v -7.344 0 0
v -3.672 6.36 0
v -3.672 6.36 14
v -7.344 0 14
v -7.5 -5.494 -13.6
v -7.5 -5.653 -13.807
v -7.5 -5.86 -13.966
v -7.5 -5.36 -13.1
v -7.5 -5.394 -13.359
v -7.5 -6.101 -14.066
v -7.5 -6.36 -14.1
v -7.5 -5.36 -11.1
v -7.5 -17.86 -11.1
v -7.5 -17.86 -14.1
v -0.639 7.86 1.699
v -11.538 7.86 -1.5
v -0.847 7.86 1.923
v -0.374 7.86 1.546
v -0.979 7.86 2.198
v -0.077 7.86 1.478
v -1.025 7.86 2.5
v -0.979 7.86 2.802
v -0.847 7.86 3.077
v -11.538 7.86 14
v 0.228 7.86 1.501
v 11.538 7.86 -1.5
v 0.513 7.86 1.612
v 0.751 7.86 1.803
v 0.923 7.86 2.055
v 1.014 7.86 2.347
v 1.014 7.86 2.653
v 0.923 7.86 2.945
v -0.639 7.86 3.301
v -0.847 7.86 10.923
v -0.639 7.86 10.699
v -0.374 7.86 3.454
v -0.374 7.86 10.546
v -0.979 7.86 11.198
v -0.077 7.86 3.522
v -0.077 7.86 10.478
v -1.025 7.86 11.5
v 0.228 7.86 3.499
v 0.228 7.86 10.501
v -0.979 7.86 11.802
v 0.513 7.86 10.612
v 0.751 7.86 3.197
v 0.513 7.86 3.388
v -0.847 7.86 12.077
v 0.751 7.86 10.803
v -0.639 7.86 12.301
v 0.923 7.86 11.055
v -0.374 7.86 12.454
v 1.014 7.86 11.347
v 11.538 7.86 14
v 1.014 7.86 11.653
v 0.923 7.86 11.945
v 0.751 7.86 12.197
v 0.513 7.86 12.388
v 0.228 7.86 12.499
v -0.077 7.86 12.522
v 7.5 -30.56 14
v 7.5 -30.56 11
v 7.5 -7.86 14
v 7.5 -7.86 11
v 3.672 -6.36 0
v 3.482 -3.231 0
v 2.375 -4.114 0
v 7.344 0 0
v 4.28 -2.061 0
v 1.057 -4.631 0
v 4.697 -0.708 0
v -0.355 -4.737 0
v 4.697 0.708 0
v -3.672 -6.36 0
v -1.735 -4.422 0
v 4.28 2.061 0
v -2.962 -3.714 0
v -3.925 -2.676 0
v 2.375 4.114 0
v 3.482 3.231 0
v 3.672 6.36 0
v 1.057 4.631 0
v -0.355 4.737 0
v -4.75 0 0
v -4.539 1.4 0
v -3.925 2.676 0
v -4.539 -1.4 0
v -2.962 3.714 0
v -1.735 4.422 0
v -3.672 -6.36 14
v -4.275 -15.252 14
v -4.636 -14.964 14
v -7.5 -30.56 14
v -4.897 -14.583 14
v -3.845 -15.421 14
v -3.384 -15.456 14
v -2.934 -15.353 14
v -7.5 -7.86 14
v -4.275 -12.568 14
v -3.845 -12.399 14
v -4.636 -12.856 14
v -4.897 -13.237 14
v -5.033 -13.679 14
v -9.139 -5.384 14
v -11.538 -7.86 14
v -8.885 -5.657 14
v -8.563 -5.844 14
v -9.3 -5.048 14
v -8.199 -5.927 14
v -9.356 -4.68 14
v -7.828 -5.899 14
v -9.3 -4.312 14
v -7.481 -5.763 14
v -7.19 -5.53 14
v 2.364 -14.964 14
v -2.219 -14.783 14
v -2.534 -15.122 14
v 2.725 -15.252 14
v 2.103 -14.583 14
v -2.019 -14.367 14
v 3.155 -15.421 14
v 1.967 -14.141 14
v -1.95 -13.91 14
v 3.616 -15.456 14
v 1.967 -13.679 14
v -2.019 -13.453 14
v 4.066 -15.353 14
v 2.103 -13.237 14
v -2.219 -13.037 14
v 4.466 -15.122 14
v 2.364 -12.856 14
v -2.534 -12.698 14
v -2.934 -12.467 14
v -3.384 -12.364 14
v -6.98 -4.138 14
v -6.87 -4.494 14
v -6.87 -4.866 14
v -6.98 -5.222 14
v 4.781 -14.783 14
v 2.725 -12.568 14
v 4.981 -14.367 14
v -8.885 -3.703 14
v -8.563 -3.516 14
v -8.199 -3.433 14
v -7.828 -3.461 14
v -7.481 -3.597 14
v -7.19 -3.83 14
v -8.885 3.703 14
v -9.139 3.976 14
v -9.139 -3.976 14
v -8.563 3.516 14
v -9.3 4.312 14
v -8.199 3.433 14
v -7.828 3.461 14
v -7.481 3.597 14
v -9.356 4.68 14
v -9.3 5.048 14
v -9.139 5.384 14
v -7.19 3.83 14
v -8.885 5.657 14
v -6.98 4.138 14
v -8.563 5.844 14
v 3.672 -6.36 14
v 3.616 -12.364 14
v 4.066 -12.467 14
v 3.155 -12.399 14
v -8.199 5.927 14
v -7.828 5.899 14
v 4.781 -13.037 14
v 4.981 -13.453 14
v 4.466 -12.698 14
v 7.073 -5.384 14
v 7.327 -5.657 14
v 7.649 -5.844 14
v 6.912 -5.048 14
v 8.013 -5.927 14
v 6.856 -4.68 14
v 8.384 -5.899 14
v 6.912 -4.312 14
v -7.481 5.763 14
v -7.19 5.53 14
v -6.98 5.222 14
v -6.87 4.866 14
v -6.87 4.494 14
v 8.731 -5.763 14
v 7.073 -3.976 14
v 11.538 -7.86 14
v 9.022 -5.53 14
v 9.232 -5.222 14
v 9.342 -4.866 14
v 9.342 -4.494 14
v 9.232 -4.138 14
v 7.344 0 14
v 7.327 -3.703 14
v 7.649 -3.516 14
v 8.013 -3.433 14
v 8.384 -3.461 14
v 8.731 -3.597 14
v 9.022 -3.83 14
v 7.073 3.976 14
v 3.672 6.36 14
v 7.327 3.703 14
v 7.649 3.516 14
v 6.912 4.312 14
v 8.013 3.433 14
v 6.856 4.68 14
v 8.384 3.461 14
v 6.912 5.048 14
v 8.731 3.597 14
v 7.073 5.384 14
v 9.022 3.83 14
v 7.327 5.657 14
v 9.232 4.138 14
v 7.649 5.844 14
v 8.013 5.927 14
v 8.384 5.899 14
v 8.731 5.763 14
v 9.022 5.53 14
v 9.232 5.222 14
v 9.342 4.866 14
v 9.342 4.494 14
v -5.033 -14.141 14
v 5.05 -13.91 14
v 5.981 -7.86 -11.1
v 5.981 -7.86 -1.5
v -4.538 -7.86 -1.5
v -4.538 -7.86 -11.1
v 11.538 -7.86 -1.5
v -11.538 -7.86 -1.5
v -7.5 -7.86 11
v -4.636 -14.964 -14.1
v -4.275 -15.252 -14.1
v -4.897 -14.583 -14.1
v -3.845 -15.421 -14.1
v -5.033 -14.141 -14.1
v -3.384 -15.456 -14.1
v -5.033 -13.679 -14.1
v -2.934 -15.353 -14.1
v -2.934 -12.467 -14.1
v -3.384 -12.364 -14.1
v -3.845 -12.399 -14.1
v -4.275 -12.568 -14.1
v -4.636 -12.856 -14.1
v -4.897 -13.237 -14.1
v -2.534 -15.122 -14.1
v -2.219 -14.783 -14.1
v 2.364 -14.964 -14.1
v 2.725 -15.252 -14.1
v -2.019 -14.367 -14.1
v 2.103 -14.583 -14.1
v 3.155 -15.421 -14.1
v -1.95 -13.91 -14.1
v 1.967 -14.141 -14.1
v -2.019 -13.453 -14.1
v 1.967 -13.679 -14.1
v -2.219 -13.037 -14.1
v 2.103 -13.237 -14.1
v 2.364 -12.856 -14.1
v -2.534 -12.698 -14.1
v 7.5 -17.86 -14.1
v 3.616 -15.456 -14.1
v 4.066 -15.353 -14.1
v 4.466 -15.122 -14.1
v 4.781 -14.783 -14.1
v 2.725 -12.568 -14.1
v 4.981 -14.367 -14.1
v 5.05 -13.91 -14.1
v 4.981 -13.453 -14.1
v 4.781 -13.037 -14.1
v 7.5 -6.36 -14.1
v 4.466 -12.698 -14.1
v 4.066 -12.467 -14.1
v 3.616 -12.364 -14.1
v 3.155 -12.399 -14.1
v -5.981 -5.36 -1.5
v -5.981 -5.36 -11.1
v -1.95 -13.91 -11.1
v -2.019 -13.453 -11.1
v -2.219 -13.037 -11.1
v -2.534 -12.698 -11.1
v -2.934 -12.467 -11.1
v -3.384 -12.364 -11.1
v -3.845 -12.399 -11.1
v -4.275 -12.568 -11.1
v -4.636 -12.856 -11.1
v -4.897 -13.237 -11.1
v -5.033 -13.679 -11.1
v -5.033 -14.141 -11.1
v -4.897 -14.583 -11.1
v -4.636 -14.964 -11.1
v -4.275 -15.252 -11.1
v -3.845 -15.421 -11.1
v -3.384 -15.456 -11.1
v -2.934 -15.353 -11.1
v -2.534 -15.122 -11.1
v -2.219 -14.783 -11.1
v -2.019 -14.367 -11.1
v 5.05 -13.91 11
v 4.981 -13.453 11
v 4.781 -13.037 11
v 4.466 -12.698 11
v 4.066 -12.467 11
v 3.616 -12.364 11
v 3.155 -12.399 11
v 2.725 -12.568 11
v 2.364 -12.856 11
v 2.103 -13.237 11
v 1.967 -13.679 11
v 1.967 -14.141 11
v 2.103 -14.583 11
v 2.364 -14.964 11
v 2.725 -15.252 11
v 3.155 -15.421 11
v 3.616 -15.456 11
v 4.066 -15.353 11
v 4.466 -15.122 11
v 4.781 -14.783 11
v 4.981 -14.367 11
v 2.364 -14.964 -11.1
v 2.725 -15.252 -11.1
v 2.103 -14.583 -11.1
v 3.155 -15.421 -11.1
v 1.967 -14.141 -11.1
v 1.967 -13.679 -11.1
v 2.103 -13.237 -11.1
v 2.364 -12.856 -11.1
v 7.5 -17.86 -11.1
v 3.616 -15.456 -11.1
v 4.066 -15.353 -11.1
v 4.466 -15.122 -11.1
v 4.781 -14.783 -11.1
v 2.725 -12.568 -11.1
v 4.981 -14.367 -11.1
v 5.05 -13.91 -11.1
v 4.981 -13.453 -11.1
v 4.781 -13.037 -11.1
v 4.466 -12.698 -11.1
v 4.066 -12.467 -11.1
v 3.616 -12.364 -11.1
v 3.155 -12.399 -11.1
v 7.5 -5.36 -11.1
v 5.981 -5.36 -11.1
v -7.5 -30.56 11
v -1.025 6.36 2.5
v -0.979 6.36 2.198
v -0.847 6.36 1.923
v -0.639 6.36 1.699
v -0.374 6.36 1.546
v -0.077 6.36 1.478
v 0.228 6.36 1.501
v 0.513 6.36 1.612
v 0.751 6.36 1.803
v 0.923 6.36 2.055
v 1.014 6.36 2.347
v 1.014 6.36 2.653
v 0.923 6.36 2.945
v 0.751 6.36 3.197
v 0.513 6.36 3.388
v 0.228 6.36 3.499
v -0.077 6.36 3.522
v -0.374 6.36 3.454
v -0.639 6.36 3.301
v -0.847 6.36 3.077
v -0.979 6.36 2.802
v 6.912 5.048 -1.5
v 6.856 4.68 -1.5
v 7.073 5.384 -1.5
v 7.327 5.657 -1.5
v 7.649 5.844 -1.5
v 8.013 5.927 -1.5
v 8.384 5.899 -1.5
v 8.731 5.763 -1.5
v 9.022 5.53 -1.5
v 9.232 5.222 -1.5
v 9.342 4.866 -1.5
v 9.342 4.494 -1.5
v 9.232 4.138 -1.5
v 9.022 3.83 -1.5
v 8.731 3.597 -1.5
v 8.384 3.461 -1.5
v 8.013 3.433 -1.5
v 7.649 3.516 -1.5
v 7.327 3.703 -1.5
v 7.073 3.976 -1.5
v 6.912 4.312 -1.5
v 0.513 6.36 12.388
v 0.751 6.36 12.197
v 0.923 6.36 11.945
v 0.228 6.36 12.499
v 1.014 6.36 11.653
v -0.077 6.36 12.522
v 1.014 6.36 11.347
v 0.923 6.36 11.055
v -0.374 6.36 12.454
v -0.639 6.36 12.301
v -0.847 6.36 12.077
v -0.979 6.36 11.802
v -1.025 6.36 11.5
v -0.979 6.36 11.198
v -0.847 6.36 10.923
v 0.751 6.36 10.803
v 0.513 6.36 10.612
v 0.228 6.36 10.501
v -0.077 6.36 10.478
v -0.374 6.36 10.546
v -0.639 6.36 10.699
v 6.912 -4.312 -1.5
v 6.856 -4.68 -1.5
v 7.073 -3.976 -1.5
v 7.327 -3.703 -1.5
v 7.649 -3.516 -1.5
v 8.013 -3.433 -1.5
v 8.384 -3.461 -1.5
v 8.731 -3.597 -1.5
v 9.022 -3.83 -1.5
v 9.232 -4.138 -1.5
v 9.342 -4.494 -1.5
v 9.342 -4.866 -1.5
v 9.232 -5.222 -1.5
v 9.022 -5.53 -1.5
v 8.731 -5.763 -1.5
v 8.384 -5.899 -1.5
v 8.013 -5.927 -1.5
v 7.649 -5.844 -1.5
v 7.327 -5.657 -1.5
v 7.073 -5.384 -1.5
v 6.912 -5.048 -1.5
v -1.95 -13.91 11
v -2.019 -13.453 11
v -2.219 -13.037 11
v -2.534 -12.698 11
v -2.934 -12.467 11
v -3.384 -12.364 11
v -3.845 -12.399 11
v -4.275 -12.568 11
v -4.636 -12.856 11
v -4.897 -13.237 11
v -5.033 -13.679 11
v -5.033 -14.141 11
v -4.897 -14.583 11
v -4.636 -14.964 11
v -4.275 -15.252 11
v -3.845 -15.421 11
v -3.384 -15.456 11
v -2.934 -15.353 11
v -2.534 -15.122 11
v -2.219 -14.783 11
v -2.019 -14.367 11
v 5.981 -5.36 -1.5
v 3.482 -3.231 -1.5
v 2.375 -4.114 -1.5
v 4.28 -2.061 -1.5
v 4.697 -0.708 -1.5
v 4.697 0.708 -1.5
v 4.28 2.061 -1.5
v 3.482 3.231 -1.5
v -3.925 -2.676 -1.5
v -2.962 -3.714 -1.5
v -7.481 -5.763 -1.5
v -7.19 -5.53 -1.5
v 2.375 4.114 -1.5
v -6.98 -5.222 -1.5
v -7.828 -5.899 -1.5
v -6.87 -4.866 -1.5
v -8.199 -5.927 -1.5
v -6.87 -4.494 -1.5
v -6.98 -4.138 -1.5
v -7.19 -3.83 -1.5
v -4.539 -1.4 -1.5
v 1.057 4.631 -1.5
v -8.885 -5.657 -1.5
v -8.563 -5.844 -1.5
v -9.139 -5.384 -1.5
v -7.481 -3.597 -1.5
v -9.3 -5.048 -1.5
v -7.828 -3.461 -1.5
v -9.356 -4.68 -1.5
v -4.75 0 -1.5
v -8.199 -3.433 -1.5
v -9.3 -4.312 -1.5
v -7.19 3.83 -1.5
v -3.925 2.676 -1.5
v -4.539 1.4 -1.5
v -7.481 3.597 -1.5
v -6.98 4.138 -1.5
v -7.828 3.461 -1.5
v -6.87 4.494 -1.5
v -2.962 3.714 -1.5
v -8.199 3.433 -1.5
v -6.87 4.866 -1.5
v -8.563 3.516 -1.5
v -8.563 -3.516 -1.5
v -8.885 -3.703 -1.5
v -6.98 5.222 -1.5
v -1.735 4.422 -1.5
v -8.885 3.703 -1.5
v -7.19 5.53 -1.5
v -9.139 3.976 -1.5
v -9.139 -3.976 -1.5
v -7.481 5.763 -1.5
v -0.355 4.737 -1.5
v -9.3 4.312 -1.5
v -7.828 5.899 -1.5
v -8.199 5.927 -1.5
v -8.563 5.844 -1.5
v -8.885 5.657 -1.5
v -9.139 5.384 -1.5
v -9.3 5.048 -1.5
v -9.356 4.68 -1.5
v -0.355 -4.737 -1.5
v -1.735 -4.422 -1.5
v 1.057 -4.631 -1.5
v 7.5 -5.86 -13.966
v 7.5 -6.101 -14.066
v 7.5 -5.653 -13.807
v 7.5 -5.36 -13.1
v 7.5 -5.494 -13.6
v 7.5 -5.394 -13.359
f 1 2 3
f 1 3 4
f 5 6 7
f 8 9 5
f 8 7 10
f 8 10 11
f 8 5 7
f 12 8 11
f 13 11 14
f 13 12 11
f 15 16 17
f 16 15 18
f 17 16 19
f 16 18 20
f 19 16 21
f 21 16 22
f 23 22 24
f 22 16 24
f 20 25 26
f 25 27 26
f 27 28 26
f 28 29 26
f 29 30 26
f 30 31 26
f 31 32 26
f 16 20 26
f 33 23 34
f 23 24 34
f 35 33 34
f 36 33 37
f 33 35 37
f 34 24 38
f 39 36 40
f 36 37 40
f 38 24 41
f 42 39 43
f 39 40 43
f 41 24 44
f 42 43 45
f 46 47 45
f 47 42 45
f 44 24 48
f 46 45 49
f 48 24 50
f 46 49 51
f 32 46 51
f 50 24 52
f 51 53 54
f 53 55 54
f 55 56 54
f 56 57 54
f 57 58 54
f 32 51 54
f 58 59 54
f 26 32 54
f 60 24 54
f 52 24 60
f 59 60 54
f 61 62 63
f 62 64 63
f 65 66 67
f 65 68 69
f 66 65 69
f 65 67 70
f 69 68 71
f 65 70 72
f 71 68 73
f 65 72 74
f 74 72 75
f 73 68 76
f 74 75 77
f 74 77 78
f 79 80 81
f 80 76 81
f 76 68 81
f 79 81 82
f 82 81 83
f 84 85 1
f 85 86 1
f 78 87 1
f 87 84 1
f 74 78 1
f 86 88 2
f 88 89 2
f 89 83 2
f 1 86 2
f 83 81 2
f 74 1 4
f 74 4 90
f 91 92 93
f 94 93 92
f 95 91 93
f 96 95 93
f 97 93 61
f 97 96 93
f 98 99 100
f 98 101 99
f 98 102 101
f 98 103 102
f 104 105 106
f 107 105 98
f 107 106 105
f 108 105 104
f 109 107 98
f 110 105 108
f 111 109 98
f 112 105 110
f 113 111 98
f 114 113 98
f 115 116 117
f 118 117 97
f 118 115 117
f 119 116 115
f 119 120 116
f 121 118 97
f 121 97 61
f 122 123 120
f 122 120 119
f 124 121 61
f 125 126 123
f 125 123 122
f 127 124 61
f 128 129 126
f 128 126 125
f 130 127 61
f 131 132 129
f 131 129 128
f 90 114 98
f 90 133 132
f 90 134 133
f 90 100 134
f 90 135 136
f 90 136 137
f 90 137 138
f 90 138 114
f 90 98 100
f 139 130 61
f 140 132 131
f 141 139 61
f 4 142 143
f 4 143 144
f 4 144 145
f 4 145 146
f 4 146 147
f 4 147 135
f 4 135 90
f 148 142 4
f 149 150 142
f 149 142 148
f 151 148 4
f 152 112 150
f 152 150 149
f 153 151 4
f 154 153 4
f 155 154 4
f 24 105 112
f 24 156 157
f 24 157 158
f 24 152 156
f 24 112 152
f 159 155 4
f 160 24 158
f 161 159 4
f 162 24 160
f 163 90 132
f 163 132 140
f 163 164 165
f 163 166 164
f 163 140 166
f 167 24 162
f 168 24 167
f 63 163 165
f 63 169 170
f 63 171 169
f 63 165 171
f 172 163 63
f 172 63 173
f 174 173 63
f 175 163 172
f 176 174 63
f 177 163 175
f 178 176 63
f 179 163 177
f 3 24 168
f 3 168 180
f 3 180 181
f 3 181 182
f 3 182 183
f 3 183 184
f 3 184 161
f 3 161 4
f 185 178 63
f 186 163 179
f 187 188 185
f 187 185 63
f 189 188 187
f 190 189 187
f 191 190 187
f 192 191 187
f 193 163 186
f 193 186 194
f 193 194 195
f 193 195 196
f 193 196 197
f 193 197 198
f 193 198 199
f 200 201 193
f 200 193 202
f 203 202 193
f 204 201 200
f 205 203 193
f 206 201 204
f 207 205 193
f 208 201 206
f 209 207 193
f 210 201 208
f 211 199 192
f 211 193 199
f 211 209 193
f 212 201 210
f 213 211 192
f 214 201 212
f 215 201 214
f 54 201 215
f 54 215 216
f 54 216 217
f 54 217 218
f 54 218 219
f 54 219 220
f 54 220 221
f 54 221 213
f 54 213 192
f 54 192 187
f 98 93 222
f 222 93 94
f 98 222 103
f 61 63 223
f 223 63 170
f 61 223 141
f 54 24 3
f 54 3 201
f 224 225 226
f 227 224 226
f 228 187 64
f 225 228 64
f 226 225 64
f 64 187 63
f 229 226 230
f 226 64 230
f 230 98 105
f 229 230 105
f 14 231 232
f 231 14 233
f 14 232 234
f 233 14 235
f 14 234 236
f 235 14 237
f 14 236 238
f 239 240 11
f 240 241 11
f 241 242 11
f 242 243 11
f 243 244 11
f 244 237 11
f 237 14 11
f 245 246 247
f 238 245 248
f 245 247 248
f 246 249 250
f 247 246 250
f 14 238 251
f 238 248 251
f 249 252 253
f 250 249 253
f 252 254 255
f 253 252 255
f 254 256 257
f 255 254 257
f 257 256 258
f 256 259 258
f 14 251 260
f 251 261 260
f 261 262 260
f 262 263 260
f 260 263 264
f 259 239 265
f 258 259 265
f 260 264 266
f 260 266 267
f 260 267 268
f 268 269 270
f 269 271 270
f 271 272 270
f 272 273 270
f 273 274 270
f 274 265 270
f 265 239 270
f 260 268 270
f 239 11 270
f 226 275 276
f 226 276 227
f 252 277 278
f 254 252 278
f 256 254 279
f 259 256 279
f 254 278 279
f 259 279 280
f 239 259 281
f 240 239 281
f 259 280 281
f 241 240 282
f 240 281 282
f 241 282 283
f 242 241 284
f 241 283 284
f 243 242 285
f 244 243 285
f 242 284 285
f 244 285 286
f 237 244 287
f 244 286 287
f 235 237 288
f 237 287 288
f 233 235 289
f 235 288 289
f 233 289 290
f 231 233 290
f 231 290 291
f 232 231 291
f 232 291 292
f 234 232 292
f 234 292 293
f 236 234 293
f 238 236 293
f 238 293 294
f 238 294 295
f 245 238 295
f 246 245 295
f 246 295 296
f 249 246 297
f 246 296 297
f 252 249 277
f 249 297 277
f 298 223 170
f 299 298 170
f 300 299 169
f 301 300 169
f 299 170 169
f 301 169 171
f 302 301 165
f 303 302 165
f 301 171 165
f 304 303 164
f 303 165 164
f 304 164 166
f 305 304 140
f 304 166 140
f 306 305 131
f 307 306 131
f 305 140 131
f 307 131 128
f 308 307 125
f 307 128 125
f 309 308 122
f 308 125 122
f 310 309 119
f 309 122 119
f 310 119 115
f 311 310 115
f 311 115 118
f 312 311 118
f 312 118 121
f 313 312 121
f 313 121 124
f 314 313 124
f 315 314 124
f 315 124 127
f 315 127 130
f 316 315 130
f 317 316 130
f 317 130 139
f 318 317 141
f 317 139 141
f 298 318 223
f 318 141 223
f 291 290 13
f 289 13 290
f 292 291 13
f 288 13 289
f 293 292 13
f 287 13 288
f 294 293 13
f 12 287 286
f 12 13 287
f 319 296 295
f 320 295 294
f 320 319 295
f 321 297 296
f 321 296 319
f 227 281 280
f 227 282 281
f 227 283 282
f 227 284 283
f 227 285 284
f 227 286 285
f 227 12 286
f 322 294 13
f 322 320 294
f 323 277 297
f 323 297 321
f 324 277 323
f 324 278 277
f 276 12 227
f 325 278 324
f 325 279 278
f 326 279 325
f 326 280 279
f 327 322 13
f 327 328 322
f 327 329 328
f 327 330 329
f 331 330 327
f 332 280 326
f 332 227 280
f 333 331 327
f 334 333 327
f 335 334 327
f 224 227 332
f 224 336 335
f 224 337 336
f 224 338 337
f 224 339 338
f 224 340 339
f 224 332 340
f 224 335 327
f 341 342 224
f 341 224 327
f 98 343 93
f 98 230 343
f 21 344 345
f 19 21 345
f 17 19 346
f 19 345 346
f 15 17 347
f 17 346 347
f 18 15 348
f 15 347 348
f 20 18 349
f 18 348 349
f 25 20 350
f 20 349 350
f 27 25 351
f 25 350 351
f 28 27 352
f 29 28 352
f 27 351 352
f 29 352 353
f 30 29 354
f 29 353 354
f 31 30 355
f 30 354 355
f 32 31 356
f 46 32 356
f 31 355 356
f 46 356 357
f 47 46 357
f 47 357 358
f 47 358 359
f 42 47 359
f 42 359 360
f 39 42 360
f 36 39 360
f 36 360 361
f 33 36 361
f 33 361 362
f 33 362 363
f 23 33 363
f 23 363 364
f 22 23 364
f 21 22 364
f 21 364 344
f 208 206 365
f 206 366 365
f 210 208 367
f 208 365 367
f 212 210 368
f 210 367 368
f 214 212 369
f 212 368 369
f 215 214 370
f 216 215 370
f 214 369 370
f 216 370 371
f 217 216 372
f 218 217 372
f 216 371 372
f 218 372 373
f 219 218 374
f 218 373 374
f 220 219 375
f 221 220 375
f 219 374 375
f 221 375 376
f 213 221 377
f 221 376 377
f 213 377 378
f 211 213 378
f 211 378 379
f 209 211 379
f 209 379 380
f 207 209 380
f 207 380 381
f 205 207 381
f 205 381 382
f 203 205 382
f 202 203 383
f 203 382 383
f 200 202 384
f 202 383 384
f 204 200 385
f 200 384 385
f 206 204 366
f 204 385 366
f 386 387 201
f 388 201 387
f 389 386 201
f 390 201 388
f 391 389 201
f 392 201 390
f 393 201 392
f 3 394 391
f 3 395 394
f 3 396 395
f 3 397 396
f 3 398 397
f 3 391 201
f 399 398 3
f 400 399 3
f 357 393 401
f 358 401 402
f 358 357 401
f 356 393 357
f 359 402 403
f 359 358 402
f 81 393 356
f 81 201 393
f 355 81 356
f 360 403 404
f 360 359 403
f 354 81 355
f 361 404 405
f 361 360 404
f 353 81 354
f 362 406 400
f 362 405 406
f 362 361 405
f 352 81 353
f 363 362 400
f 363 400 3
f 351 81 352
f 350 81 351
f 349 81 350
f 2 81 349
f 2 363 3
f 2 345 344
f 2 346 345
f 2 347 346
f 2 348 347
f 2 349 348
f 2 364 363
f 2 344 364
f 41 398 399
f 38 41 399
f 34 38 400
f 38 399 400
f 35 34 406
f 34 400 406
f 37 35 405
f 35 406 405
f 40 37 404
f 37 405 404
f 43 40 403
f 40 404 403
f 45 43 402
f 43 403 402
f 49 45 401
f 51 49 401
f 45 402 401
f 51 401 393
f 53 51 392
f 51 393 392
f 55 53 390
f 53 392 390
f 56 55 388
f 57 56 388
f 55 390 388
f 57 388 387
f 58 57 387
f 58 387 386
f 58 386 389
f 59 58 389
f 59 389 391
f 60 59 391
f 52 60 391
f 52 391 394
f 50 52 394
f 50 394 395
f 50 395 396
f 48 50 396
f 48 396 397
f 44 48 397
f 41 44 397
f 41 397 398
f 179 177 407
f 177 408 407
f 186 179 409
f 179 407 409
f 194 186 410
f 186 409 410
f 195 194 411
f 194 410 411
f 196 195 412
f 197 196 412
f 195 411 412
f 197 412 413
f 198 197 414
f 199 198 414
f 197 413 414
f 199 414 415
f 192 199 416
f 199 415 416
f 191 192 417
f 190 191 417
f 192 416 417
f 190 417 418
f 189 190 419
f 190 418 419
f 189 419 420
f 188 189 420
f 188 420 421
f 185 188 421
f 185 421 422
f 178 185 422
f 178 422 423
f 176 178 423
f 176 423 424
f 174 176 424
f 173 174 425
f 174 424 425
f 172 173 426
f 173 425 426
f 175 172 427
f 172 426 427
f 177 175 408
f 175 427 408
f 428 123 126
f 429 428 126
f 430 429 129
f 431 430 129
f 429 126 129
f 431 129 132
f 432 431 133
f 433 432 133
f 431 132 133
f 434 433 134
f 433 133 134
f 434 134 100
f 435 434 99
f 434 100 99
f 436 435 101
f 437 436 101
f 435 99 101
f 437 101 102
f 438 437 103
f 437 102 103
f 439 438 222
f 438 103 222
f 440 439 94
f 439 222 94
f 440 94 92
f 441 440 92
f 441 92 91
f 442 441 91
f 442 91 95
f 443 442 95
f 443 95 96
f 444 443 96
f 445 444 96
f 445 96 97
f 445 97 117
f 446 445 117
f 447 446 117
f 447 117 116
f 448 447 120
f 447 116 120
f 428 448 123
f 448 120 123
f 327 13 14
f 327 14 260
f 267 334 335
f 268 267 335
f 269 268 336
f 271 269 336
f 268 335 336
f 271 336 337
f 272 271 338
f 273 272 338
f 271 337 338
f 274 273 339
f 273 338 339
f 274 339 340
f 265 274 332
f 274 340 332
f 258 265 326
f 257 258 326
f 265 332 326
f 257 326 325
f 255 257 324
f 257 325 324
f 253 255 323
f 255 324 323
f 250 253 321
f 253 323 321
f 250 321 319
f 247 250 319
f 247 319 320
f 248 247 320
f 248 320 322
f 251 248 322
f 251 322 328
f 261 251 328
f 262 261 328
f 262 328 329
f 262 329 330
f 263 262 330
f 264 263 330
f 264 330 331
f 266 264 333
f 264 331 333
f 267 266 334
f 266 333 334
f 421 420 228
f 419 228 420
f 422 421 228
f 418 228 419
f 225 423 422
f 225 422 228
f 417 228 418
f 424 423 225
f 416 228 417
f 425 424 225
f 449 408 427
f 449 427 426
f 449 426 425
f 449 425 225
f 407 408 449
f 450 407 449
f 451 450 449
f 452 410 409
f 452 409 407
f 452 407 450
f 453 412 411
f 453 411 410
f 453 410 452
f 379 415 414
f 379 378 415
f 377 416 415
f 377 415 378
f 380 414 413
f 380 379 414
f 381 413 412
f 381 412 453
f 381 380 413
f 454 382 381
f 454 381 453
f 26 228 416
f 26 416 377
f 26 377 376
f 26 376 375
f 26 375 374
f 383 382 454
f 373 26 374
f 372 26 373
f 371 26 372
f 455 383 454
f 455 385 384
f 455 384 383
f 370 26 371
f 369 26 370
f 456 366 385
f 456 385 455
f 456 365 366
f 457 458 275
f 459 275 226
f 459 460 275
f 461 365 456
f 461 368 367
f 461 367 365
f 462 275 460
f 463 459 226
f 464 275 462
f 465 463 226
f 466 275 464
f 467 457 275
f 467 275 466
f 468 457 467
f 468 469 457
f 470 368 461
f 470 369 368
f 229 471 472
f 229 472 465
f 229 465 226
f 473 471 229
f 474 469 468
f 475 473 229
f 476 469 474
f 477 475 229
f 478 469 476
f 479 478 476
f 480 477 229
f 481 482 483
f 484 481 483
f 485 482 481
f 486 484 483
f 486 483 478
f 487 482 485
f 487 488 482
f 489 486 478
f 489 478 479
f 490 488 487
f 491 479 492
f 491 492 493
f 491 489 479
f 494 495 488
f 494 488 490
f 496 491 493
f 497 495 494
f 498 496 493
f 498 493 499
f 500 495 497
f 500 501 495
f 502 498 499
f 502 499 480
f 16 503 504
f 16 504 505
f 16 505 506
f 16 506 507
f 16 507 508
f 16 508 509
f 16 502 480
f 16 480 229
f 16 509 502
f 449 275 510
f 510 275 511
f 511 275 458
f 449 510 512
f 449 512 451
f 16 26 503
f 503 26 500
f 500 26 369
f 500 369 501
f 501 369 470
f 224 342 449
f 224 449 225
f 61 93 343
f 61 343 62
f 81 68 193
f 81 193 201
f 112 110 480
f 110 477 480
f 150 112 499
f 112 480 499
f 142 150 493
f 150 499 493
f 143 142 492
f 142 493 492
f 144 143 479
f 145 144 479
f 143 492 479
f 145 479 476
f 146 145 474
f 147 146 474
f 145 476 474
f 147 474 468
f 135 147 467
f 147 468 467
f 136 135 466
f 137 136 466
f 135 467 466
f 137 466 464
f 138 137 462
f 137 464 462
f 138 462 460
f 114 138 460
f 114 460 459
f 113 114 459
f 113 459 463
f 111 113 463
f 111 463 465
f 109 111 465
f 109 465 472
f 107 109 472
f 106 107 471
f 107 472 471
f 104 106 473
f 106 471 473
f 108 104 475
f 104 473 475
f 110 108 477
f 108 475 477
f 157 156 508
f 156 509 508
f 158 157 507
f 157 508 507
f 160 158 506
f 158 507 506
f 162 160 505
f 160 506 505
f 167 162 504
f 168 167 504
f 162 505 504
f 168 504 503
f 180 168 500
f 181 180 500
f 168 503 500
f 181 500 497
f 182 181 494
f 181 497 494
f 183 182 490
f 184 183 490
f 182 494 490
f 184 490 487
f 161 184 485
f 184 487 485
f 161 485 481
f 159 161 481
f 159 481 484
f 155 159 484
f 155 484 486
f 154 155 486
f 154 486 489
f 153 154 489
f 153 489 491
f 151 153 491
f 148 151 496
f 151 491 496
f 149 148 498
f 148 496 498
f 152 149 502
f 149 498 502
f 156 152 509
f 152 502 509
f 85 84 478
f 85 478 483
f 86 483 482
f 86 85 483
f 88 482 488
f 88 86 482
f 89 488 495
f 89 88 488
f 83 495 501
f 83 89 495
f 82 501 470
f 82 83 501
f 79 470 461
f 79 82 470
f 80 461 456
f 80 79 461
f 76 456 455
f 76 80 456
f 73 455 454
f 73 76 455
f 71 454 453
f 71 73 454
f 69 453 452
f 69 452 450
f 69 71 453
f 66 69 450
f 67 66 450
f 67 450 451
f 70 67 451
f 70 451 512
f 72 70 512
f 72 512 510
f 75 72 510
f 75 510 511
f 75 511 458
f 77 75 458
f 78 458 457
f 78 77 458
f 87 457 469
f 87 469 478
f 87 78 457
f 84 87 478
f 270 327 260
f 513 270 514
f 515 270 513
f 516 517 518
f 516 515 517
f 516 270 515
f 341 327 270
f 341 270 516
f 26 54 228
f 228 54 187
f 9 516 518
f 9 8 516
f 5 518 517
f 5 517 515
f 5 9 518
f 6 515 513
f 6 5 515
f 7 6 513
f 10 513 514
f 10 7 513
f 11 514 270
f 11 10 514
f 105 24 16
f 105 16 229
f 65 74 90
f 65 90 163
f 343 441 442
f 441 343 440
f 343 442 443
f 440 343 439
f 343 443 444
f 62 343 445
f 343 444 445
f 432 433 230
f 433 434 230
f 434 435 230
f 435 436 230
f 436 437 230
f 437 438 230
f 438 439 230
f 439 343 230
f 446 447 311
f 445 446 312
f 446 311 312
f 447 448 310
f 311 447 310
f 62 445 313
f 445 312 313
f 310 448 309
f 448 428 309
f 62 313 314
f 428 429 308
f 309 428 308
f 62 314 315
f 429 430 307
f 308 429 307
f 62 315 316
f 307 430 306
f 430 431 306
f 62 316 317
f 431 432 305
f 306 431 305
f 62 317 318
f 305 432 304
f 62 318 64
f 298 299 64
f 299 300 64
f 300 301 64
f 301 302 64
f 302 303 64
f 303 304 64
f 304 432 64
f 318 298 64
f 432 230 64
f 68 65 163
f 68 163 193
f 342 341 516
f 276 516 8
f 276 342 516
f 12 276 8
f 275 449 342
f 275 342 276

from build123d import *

# Parameters (mm, degrees)
BOSS_EXTRUDE1_DEPTH     = 14
SKETCH2_R               = 4.75
BOSS_EXTRUDE2_DEPTH     = 1.5
SKETCH8_R               = 1.55
BOSS_EXTRUDE3_DEPTH     = 3
BOSS_EXTRUDE4_START     = -25.1
SKETCH8_2_R             = 1.55
BOSS_EXTRUDE4_DEPTH     = 3
BOSS_EXTRUDE6_DEPTH     = 12.6
M2_5_TAPPED_HOLE1_D     = 2.05
M2_5_TAPPED_HOLE1_DEPTH = 1.5
BOSS_EXTRUDE8_DEPTH     = 5
BOSS_EXTRUDE9_REACH     = 17.72
SKETCH22_W              = 4.537973116
SKETCH22_H              = 2
FILLET2_R               = 1
BOSS_EXTRUDE11_DEPTH    = 10.5
M3_TAPPED_HOLE2_D       = 2.5
M3_TAPPED_HOLE2_DEPTH   = 15.5
M3_TAPPED_HOLE2_TIP     = 0.751075774
BOSS_EXTRUDE12_DEPTH    = 9.6
SKETCH26_W              = 15
SKETCH26_H              = 3
BOSS_EXTRUDE13_DEPTH    = 12.7


with BuildPart() as part:
    # Sketch1 → Boss-Extrude1 (new body)
    with BuildSketch(Plane.XY):
        Polygon((9.075946232, 0), (4.537973116, 7.86), (-4.537973116, 7.86), (-9.075946232, 0), (-4.537973116, -7.86), (4.537973116, -7.86), align=None)
        Polygon((7.343895424, 0), (3.671947712, 6.36), (-3.671947712, 6.36), (-7.343895424, 0), (-3.671947712, -6.36), (3.671947712, -6.36), align=None, mode=Mode.SUBTRACT)
    extrude(amount=BOSS_EXTRUDE1_DEPTH)

    # Sketch2 → Boss-Extrude2 (add)
    with BuildSketch(Plane(origin=(0, 0, 0), x_dir=(-1, 0, 0), z_dir=(0, 0, -1))):
        Polygon((9.075946232, 0), (4.537973116, 7.86), (-4.537973116, 7.86), (-9.075946232, 0), (-4.537973116, -7.86), (4.537973116, -7.86), align=None)
        Circle(SKETCH2_R, mode=Mode.SUBTRACT)
    extrude(amount=BOSS_EXTRUDE2_DEPTH)

    # Sketch8 → Boss-Extrude3 (add)
    with BuildSketch(Plane.XY.offset(14)):
        Polygon((-7.5, -17.86), (7.5, -17.86), (7.5, -7.86), (9.075946232, -7.86), (9.075946232, 0), (4.537973116, -7.86), (-4.537973116, -7.86), (-9.075946232, 0), (-9.075946232, -7.86), (-7.5, -7.86), align=None)
        with Locations((-3.5, -13.91)):
            Circle(SKETCH8_R, mode=Mode.SUBTRACT)
        with Locations((3.5, -13.91)):
            Circle(SKETCH8_R, mode=Mode.SUBTRACT)
    extrude(amount=-BOSS_EXTRUDE3_DEPTH)



with BuildPart() as body_2:
    # Sketch8<2> → Boss-Extrude4 (new body)
    with BuildSketch(Plane.XY.offset(14).offset(BOSS_EXTRUDE4_START)):
        Polygon((-7.5, -7.86), (-7.5, -17.86), (7.5, -17.86), (7.5, -7.86), (7.5, -5.36), (5.981348789, -5.36), (4.537973116, -7.86), (-4.537973116, -7.86), (-5.981348789, -5.36), (-7.5, -5.36), align=None)
        with Locations((-3.5, -13.91)):
            Circle(SKETCH8_2_R, mode=Mode.SUBTRACT)
        with Locations((3.5, -13.91)):
            Circle(SKETCH8_2_R, mode=Mode.SUBTRACT)
    extrude(amount=-BOSS_EXTRUDE4_DEPTH)


with BuildPart() as part_1:
    add(part.part)

    add(body_2.part)  # Boss-Extrude6 merges body 2
    # Sketch9 → Boss-Extrude6 (add)
    with BuildSketch(Plane(origin=(0, 0, -1.5), x_dir=(-1, 0, 0), z_dir=(0, 0, -1))):
        Polygon((-5.981348789, -5.36), (5.981348789, -5.36), (4.537973116, -7.86), (-4.537973116, -7.86), align=None)
    extrude(amount=BOSS_EXTRUDE6_DEPTH)

    # M2.5 Tapped Hole1
    with Locations(Plane(origin=(0, 7.86, 0), x_dir=(1, 0, 0), z_dir=(0, 1, 0))):
        with Locations((0, -2.5), (0, -11.5)):
            Hole(M2_5_TAPPED_HOLE1_D / 2, depth=M2_5_TAPPED_HOLE1_DEPTH)

    # Sketch14 → Boss-Extrude8 (add)
    with BuildSketch(Plane.XY.offset(14)):
        Polygon((-4.537973116, 7.86), (-11.537973116, 7.86), (-11.537973116, -7.86), (-9.075946232, -7.86), (-9.075946232, 0), align=None)
        Polygon((9.075946232, -7.86), (9.075946232, 0), (4.537973116, 7.86), (11.537973116, 7.86), (11.537973116, -7.86), align=None)
    extrude(amount=-BOSS_EXTRUDE8_DEPTH)

    # Sketch22 → Boss-Extrude9 (add, up to next)
    with BuildSketch(Plane.XZ.offset(7.86), mode=Mode.PRIVATE) as boss_extrude9_sk1:
        with Locations((-6.806959674, 10)):
            Rectangle(SKETCH22_W, SKETCH22_H)
    boss_extrude9_tool1 = extrude(boss_extrude9_sk1.sketch, amount=-BOSS_EXTRUDE9_REACH, mode=Mode.PRIVATE) - part_1.part
    add(boss_extrude9_tool1.solids().sort_by_distance((-6.80696, -7.86, 10))[0])
    # Sketch22 → Boss-Extrude9 (add, up to next)
    with BuildSketch(Plane.XZ.offset(7.86), mode=Mode.PRIVATE) as boss_extrude9_sk2:
        with Locations((6.806959674, 10)):
            Rectangle(SKETCH22_W, SKETCH22_H)
    boss_extrude9_tool2 = extrude(boss_extrude9_sk2.sketch, amount=-BOSS_EXTRUDE9_REACH, mode=Mode.PRIVATE) - part_1.part
    add(boss_extrude9_tool2.solids().sort_by_distance((6.80696, -7.86, 10))[0])

    # Fillet2
    fillet2_edges = [part_1.edges().sort_by_distance(p)[0] for p in [
        (0, -5.36, -14.1),
    ]]
    fillet(fillet2_edges, radius=FILLET2_R)

    # Sketch24 → Boss-Extrude11 (add)
    with BuildSketch(Plane(origin=(0, 0, 9), x_dir=(-1, 0, 0), z_dir=(0, 0, -1))):
        Polygon((-11.537973116, -7.86), (-4.537973116, -7.86), (-9.075946232, 0), (-4.537973116, 7.86), (-11.537973116, 7.86), align=None)
        Polygon((4.537973116, 7.86), (9.075946232, 0), (4.537973116, -7.86), (11.537973116, -7.86), (11.537973116, 7.86), align=None)
    extrude(amount=BOSS_EXTRUDE11_DEPTH)

    # M3 Tapped Hole2
    with Locations(Plane.XY.offset(14)):
        with Locations((-8.105997779, 4.68), (-8.105997779, -4.68), (8.105997779, 4.68), (8.105997779, -4.68)):
            Hole(M3_TAPPED_HOLE2_D / 2, depth=M3_TAPPED_HOLE2_DEPTH)
            with Locations((0, 0, -(M3_TAPPED_HOLE2_DEPTH + M3_TAPPED_HOLE2_TIP / 2))):  # 118° drill point
                Cone(0, M3_TAPPED_HOLE2_D / 2, M3_TAPPED_HOLE2_TIP, mode=Mode.SUBTRACT)

    # Sketch25 → Boss-Extrude12 (add)
    with BuildSketch(Plane(origin=(0, 0, -1.5), x_dir=(-1, 0, 0), z_dir=(0, 0, -1))):
        Polygon((-5.981348789, -5.36), (-5.981348789, -7.86), (-4.537973116, -7.86), align=None)
    extrude(amount=BOSS_EXTRUDE12_DEPTH)

    # Sketch26 → Boss-Extrude13 (add)
    with BuildSketch(Plane.XZ.offset(17.86)):
        with Locations((0, 12.5)):
            Rectangle(SKETCH26_W, SKETCH26_H)
    extrude(amount=BOSS_EXTRUDE13_DEPTH)


solid = part_1.part
